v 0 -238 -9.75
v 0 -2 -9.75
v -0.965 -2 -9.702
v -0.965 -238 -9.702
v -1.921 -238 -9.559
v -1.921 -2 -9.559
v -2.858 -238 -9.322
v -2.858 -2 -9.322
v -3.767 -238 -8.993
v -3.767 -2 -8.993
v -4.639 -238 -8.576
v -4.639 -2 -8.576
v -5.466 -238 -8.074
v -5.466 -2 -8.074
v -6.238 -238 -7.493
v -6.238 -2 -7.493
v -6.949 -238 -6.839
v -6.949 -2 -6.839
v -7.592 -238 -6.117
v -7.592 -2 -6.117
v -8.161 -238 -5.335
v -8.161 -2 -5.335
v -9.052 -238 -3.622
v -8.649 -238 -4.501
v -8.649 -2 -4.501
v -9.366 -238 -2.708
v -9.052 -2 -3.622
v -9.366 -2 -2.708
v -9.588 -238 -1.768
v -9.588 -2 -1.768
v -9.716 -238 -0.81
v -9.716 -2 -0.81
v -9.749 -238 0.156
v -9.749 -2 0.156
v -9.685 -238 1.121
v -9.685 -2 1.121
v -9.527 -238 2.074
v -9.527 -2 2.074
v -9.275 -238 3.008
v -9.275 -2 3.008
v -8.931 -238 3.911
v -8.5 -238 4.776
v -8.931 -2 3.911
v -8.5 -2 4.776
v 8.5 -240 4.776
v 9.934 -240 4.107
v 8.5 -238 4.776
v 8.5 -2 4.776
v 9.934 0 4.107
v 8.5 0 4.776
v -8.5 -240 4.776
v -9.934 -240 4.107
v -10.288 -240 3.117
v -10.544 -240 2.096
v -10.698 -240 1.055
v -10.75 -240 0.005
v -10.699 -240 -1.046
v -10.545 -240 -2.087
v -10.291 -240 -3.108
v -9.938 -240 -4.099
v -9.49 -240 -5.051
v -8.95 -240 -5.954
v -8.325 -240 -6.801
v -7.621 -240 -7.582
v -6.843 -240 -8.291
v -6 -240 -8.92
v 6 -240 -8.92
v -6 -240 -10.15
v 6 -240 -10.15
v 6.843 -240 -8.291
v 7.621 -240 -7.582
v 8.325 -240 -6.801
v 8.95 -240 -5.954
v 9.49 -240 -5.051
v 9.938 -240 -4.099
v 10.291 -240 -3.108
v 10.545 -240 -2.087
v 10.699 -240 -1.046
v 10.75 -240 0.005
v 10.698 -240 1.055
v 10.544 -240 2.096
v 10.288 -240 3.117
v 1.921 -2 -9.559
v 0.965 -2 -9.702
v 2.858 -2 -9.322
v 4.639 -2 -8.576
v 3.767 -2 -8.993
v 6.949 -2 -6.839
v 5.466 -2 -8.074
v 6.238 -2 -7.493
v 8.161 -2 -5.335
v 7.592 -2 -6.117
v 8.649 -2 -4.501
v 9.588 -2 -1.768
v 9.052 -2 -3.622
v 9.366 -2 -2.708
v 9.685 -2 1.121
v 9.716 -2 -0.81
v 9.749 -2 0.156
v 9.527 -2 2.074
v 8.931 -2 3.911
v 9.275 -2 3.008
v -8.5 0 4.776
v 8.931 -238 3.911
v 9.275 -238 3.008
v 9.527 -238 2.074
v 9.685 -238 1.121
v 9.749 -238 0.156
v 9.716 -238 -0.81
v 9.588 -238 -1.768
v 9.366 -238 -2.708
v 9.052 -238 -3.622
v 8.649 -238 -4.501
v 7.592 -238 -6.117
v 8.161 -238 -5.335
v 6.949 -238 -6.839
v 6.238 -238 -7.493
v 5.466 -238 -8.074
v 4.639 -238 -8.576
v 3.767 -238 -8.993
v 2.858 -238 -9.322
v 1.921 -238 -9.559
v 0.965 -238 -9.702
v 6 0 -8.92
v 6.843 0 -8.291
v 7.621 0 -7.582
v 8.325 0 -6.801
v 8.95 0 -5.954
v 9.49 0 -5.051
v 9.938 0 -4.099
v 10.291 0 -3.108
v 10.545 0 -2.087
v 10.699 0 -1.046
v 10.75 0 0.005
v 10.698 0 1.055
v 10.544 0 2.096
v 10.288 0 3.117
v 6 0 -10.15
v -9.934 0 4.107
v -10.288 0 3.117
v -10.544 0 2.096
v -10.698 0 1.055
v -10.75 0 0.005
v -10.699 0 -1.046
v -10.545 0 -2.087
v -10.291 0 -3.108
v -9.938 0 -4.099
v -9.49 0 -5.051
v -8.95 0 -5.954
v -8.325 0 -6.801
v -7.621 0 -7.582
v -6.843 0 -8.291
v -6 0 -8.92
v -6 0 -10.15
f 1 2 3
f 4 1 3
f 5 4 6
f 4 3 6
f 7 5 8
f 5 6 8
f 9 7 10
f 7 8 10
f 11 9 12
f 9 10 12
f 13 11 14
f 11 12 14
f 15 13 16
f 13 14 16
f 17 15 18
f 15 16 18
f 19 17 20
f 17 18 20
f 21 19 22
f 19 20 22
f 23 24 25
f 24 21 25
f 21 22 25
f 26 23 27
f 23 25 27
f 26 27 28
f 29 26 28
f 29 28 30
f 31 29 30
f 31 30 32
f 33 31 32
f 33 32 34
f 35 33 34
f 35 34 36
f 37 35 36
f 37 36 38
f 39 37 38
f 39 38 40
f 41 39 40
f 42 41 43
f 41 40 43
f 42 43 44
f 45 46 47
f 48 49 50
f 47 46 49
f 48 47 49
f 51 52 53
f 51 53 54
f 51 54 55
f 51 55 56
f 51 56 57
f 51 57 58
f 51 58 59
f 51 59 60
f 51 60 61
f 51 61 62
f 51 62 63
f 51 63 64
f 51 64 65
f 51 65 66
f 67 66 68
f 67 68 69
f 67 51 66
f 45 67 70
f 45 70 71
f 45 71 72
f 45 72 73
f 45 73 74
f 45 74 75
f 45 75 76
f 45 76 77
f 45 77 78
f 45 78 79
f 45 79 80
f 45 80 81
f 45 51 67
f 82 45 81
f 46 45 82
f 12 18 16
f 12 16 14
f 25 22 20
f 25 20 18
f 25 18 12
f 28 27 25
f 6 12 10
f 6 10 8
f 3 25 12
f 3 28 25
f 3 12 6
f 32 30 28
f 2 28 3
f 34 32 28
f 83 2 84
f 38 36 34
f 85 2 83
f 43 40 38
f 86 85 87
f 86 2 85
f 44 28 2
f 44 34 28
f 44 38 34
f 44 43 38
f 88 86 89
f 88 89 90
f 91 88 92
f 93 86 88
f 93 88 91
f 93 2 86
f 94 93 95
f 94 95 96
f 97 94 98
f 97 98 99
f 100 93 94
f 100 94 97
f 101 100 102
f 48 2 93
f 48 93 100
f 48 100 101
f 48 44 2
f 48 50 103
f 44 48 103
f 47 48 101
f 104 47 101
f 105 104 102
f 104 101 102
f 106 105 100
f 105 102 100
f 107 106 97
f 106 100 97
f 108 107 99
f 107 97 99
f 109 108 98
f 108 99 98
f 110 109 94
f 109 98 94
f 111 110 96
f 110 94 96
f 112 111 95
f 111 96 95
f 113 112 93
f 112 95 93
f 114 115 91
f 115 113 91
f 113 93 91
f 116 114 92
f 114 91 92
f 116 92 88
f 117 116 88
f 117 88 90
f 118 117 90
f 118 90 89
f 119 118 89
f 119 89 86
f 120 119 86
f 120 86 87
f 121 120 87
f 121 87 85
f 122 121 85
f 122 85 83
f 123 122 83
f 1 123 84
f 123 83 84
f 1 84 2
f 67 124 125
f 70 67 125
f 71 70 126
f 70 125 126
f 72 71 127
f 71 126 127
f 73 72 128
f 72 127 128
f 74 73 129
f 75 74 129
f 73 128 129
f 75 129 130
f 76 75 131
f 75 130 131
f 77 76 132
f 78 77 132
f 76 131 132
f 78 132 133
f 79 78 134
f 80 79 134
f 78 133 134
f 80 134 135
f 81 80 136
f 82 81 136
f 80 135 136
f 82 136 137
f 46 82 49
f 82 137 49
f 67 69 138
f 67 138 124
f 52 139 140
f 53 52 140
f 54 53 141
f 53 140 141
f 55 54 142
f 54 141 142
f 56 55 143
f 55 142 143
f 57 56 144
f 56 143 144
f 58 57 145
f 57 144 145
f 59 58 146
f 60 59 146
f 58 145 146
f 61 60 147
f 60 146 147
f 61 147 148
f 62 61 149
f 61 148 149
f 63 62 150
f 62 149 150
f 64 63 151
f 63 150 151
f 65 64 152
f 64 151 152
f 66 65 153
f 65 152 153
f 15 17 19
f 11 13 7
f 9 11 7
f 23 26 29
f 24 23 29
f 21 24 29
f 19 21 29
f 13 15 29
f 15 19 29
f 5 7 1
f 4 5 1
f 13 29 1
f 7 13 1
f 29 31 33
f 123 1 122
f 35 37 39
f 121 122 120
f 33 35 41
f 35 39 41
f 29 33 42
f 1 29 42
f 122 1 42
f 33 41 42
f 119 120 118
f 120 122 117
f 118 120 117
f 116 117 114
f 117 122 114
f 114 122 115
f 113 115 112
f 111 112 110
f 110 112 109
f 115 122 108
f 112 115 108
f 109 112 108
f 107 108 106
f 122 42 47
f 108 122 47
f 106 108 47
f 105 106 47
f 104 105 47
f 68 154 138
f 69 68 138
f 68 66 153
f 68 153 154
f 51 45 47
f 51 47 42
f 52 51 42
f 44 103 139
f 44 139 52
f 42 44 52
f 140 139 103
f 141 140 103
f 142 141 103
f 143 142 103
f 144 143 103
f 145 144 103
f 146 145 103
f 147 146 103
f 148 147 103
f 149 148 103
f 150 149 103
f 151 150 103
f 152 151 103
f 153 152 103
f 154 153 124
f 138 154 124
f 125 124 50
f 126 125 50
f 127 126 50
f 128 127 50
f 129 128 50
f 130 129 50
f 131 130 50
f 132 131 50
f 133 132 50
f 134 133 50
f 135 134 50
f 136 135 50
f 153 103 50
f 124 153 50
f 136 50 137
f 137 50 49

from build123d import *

# Parameters (mm, degrees)
F1_DEPTH = 240
F2_DEPTH = 2
F4_DEPTH = 2


with BuildPart() as f1:
    # F0 (on Front) → F1 (new body)
    with BuildSketch(Plane.XZ):
        with BuildLine():
            ThreePointArc((-6, -8.919781), (-5.280189, -9.363872), (-4.527693, -9.75))
            Line((-4.527693, -9.75), (0, -9.75))
            ThreePointArc((0, -9.75), (-8.415191, -4.924131), (-8.5, 4.776243))
            Line((-8.5, 4.776243), (-9.934369, 4.107408))
            ThreePointArc((-9.934369, 4.107408), (-10.290916, -3.107982), (-6, -8.919781))
        make_face()
        with BuildLine():
            ThreePointArc((8.5, 4.776243), (8.415191, -4.924131), (0, -9.75))
            Line((0, -9.75), (4.527693, -9.75))
            ThreePointArc((4.527693, -9.75), (5.280189, -9.363872), (6, -8.919781))
            ThreePointArc((6, -8.919781), (10.290916, -3.107982), (9.934369, 4.107408))
            Line((9.934369, 4.107408), (8.5, 4.776243))
        make_face()
        with BuildLine():
            Line((0, -9.75), (-4.527693, -9.75))
            ThreePointArc((-4.527693, -9.75), (-5.280189, -9.363872), (-6, -8.919781))
            Line((-6, -8.919781), (-6, -9.75))
            Line((-6, -9.75), (-6, -10.15))
            Line((-6, -10.15), (6, -10.15))
            Line((6, -10.15), (6, -9.75))
            Line((6, -9.75), (6, -8.919781))
            ThreePointArc((6, -8.919781), (5.280189, -9.363872), (4.527693, -9.75))
            Line((4.527693, -9.75), (0, -9.75))
        make_face()
    extrude(amount=F1_DEPTH)

    # F0 (on Front) → F2 (join)
    with BuildSketch(Plane.XZ):
        with BuildLine():
            ThreePointArc((-8.5, 4.776243), (-8.415191, -4.924131), (0, -9.75))
            ThreePointArc((0, -9.75), (8.415191, -4.924131), (8.5, 4.776243))
            Line((8.5, 4.776243), (-8.5, 4.776243))
        make_face()
    extrude(amount=F2_DEPTH)

    # F3 (on face) → F4 (join)
    with BuildSketch(Plane.XZ.offset(240)):
        with BuildLine():
            Line((8.5, 4.776243), (-8.5, 4.776243))
            ThreePointArc((-8.5, 4.776243), (0, -9.75), (8.5, 4.776243))
        make_face()
    extrude(amount=-F4_DEPTH)


solid = f1.part
